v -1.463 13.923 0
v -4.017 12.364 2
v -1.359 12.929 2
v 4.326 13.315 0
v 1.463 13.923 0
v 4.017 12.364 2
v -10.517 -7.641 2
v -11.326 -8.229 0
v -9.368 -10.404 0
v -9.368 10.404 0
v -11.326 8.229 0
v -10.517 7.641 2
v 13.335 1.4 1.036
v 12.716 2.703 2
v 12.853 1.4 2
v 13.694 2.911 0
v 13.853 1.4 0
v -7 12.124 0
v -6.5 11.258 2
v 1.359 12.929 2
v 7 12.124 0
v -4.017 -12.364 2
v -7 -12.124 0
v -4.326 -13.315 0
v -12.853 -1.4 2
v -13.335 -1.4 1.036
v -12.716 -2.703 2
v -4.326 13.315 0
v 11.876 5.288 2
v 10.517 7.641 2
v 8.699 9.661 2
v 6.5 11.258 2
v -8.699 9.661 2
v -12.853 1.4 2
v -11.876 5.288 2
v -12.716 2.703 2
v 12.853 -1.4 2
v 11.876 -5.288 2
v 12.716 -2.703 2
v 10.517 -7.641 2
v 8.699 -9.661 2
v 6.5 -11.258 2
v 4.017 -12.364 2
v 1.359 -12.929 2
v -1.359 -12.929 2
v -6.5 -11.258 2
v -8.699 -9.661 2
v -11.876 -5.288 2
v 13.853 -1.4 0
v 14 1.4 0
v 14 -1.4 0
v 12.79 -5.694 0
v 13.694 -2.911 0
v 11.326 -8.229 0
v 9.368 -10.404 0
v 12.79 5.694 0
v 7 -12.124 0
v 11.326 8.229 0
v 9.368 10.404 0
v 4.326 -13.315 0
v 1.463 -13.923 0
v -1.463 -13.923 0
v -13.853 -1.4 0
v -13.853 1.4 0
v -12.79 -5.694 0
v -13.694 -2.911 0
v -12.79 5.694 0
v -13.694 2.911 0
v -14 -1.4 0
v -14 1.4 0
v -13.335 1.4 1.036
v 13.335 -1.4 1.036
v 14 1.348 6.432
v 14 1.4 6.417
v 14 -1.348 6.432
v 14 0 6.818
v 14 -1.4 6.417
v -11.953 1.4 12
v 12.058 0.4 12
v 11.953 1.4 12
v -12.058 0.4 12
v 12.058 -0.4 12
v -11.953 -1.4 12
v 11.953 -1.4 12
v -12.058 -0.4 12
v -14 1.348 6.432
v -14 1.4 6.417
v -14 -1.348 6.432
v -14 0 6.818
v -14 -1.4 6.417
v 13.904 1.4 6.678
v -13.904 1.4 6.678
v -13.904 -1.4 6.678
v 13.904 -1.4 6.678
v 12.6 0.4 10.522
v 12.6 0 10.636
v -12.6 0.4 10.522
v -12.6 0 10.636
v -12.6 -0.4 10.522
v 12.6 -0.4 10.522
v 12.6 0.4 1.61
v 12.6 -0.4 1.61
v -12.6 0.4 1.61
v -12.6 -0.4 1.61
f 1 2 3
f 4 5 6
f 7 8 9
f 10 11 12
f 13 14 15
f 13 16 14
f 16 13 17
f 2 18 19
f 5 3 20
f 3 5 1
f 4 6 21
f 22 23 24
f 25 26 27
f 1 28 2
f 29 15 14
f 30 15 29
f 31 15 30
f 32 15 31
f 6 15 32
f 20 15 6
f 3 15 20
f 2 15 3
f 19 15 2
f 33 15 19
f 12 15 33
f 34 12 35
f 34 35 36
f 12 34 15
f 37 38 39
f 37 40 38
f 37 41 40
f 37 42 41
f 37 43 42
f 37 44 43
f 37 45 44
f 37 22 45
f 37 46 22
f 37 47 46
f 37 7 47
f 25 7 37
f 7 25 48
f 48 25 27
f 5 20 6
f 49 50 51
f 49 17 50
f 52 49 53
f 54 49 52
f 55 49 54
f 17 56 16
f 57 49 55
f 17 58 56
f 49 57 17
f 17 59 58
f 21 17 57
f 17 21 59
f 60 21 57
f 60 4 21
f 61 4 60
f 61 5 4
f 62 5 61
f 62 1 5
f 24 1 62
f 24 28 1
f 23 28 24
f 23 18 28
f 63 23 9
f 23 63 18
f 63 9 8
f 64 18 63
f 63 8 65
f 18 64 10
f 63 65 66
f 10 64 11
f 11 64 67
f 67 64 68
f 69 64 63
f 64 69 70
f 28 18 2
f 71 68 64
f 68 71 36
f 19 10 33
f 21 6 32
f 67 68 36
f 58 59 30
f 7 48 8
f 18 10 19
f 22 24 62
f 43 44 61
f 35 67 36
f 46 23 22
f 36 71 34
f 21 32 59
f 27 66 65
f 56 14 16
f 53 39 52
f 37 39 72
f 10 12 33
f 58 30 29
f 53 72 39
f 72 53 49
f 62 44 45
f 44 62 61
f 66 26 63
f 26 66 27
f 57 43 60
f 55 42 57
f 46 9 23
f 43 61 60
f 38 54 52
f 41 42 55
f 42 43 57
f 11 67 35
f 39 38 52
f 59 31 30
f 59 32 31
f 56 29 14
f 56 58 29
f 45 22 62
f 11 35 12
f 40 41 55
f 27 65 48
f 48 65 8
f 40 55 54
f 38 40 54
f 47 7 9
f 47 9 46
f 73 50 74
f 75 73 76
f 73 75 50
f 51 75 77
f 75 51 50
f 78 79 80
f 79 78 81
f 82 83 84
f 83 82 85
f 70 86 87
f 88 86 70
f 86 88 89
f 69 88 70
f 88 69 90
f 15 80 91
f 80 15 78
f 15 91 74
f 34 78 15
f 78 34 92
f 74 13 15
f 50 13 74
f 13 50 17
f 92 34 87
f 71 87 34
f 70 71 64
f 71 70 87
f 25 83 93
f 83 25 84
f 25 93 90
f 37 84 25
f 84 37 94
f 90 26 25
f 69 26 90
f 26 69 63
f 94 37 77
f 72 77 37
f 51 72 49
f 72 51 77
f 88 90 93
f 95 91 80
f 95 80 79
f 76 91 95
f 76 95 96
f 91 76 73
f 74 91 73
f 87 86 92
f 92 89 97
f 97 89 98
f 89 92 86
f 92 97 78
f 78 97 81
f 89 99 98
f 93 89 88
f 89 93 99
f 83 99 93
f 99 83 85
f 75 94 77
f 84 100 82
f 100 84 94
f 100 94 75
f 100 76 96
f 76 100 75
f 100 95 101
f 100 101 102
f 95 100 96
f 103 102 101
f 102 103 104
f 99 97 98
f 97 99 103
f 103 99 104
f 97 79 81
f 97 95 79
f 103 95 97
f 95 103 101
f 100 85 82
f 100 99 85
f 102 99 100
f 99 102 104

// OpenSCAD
base_top_diameter = 26;
base_bottom_diameter = 28;
base_height = 2;

grip_height = 10;

slot_width = 25.2;
slot_thickness = 0.8;
slot_deepness = 10.4;

module slot() {    
  translate([0, 0, grip_height + base_height - slot_deepness / 2 + 0.01]) {
    cube(size=[slot_width, slot_thickness, slot_deepness], center=true);
  }
}

module stand() {
  cylinder(h=base_height, d1=base_bottom_diameter, d2=base_top_diameter, center=false);
}

module grip() {
  translate([0, 0, grip_height - grip_height / 2 + base_height / 2]) {
    cube(size=[base_bottom_diameter, 2.8, grip_height + base_height], center=true);
  }
}

module main_body() {
  intersection(){
    union() {
      stand();
      grip();
    }
    union(){
      cylinder(h=base_height + grip_height, d1=base_bottom_diameter + 5, d2= slot_width - 1, center=false);
    }
  };
}

module main() {
  difference() {
    main_body();
    slot();
  }
}

//stand();
//grip();
//slot();
main();
